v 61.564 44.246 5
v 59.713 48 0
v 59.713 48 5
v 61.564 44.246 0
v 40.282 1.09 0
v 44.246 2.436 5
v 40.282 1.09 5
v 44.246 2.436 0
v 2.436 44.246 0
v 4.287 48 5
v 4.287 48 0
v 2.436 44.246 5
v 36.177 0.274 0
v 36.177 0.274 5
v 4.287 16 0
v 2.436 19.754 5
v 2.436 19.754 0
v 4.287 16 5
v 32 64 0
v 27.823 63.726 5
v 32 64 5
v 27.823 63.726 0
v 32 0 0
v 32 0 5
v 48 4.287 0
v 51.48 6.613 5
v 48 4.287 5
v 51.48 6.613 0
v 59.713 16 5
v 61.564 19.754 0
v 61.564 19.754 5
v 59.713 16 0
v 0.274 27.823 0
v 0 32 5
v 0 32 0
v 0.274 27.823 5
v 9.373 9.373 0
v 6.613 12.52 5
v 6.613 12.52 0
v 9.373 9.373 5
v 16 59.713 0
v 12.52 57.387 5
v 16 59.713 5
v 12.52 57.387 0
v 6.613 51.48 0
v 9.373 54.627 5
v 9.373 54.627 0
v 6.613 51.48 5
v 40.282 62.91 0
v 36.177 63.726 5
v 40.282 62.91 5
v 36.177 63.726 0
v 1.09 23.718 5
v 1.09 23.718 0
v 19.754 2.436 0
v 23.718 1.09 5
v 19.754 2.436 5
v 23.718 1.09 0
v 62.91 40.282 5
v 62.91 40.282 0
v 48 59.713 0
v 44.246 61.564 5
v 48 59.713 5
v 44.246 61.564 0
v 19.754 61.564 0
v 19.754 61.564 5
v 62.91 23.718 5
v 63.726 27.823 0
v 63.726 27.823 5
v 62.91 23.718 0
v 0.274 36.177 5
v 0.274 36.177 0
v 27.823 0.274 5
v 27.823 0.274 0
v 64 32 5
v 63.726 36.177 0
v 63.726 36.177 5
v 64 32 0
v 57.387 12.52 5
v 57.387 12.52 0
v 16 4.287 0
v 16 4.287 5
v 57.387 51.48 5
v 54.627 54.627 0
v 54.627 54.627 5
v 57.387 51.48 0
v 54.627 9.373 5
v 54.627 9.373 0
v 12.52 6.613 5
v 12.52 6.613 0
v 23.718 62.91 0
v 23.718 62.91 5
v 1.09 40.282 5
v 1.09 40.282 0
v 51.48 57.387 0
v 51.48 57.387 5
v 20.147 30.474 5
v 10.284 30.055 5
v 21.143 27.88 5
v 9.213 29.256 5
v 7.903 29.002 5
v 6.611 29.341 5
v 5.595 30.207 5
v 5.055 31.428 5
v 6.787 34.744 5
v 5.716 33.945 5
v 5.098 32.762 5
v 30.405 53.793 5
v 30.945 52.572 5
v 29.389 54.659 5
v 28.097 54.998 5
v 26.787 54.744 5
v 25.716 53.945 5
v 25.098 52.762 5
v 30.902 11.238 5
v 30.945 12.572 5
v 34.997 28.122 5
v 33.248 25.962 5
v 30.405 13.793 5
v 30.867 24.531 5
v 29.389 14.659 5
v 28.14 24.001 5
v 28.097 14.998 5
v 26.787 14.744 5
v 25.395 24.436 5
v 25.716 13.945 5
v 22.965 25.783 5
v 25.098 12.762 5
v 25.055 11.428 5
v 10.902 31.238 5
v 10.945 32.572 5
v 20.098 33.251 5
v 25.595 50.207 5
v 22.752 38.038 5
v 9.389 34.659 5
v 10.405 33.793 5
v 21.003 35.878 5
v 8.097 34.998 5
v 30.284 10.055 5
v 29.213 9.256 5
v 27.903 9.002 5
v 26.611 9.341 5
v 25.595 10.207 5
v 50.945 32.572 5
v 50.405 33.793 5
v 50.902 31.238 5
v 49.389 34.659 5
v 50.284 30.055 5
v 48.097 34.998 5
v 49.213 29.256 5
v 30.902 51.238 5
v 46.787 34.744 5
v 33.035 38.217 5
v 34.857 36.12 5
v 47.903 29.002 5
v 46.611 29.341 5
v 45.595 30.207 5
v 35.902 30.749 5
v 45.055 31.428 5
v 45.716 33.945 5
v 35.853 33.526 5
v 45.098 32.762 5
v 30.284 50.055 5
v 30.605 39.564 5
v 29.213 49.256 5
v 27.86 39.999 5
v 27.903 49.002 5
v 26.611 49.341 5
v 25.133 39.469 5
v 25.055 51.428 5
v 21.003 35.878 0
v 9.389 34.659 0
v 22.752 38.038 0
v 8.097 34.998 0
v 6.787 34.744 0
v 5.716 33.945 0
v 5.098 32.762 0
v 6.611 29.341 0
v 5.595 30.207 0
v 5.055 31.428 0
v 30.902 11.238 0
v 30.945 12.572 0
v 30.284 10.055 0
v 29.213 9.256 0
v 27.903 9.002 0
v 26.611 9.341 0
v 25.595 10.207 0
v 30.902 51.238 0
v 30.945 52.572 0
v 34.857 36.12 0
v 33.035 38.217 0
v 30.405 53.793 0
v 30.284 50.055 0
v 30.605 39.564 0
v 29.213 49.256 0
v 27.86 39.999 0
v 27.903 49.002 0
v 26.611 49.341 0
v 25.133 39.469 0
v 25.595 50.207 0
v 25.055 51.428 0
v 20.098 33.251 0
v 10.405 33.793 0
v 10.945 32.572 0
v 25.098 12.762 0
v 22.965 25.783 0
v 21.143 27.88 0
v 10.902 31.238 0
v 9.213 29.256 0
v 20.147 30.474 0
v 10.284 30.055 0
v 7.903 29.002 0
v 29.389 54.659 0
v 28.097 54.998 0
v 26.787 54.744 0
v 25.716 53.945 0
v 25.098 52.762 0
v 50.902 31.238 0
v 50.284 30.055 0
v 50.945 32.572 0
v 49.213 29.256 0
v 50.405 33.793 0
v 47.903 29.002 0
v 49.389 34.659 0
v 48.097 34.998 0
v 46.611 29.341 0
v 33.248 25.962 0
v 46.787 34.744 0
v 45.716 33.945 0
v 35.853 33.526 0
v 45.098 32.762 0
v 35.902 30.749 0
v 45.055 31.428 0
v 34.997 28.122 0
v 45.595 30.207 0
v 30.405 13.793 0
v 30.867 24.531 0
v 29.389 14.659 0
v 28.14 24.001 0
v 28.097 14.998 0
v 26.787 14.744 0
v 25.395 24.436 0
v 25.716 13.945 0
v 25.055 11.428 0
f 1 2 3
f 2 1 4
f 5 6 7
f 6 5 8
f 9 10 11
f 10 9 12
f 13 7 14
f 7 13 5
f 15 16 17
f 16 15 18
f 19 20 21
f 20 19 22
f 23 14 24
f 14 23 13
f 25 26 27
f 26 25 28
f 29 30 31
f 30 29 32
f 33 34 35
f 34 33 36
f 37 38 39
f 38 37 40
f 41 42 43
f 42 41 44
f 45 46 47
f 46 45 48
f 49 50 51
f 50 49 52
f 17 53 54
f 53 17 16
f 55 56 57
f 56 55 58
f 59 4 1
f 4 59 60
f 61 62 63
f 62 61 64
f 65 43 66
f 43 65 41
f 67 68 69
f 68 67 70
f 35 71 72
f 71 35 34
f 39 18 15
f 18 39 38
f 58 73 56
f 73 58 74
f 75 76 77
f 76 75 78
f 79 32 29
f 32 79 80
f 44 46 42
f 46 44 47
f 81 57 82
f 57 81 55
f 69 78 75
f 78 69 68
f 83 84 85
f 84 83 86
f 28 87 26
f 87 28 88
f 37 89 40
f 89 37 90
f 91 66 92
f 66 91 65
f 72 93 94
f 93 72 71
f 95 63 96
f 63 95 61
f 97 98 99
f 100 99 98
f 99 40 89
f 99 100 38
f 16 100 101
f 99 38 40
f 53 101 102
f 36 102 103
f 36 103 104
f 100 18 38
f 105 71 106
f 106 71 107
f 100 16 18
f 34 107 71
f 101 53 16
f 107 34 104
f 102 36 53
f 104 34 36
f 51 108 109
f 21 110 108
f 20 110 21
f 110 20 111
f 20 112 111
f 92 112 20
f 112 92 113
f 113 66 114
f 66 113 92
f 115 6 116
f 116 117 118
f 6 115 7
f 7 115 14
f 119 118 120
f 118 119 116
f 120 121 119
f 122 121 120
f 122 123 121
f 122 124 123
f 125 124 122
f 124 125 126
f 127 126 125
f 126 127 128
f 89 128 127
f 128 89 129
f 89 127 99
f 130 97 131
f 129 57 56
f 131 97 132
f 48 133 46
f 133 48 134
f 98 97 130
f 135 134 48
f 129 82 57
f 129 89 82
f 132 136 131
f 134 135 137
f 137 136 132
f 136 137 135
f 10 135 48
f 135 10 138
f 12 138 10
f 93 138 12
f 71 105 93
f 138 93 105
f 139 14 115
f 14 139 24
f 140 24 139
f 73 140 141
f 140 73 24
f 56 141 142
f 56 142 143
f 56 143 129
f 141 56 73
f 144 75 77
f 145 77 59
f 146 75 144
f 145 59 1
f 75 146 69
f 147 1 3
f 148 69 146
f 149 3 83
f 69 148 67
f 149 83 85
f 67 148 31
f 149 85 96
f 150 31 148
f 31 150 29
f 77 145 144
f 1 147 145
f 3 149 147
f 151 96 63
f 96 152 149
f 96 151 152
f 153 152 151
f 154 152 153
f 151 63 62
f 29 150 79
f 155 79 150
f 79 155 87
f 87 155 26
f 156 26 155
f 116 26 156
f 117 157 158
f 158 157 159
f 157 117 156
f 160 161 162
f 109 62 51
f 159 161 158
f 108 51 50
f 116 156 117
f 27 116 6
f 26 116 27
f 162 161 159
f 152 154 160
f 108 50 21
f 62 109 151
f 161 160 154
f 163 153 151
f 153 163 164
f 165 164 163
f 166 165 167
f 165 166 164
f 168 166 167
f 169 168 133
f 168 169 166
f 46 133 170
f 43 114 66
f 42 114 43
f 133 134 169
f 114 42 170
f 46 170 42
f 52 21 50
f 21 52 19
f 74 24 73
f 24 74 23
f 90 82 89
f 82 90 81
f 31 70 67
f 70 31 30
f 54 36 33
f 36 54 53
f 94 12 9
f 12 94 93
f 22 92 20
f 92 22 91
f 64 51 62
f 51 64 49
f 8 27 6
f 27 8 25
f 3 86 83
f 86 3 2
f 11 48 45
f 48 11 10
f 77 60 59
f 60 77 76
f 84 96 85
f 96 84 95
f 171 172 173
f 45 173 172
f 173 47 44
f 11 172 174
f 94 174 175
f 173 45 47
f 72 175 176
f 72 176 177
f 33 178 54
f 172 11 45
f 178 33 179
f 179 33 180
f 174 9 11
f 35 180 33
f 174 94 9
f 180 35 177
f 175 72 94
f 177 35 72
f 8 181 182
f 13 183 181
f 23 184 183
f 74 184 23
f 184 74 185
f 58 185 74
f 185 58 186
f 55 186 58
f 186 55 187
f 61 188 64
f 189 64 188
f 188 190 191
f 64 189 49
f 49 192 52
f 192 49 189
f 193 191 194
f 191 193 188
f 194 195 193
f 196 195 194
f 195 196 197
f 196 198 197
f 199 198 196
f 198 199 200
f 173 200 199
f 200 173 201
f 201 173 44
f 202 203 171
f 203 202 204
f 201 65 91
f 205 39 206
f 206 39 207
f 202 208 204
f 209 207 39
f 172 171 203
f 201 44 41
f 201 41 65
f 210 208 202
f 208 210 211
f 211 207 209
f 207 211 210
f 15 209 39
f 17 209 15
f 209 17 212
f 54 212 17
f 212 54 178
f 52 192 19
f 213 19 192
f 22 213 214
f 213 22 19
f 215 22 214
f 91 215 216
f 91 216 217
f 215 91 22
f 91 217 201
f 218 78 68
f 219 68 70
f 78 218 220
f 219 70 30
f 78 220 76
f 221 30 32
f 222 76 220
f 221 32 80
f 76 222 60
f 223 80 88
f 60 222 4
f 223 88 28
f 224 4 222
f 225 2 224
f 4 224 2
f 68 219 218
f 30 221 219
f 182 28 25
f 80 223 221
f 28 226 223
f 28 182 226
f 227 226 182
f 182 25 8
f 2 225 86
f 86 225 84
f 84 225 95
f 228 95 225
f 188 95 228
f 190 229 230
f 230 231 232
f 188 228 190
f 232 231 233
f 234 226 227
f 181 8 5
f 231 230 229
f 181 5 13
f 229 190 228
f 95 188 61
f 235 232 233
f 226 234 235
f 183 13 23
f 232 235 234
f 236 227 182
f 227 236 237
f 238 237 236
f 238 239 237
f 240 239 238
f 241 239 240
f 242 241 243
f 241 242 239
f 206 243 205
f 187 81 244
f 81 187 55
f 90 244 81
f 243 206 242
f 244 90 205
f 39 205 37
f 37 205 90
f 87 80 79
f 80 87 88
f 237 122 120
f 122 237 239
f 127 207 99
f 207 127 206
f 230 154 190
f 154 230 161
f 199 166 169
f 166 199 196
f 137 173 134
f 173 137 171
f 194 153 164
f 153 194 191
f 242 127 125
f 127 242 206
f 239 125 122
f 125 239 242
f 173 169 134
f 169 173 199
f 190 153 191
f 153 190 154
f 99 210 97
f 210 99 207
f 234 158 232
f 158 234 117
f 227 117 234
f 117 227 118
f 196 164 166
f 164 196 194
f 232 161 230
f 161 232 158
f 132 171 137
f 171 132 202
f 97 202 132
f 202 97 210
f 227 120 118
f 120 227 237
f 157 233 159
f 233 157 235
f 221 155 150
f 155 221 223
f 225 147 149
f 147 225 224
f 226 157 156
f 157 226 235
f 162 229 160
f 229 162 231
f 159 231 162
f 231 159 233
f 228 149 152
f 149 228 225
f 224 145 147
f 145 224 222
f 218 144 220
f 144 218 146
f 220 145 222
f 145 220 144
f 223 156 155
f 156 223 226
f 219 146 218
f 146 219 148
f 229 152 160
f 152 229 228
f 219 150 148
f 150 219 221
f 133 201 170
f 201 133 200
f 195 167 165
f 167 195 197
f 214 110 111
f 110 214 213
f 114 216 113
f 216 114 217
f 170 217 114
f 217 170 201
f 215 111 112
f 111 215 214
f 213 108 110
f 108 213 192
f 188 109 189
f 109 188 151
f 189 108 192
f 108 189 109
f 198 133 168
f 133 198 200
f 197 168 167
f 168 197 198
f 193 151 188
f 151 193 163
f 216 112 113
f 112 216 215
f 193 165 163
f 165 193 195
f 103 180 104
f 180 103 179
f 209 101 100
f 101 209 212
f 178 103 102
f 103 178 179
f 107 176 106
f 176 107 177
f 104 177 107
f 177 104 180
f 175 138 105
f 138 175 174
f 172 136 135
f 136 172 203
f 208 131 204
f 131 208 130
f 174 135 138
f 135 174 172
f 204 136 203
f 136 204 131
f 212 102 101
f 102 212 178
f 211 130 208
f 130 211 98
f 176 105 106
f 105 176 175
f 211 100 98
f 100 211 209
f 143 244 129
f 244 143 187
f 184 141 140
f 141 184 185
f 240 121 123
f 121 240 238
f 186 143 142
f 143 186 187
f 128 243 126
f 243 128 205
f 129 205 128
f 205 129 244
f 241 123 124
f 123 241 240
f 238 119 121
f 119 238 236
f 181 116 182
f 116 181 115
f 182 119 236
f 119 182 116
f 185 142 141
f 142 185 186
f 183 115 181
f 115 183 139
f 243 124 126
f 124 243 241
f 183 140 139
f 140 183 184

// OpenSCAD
$fn = 32;

// ----------------------------------------------------------------------
// Cam plate: eccentric cam, base R32
// ----------------------------------------------------------------------

// --- parameters (mm) ---
base_r = 32;              // base circle radius
lobe_h = 14;              // cam lobe rise
bore_r = 8;               // shaft bore radius
plate_t = 5;              // plate thickness, Z (extrusion height)
ecc = 4;                  // disc eccentricity
ring_r = 20;              // lightening ring radius
bolt_r = 3;               // lightening hole radius
fit_tol = 0.05;           // declared fit tolerance (prompt contract)
free_tol = 0.3;           // declared free tolerance (prompt contract)

profile = [[64, 32], [63.726, 36.177], [62.91, 40.282], [61.564, 44.246], [59.713, 48], [57.387, 51.48], [54.627, 54.627], [51.48, 57.387], [48, 59.713], [44.246, 61.564], [40.282, 62.91], [36.177, 63.726], [32, 64], [27.823, 63.726], [23.718, 62.91], [19.754, 61.564], [16, 59.713], [12.52, 57.387], [9.373, 54.627], [6.613, 51.48], [4.287, 48], [2.436, 44.246], [1.09, 40.282], [0.274, 36.177], [0, 32], [0.274, 27.823], [1.09, 23.718], [2.436, 19.754], [4.287, 16], [6.613, 12.52], [9.373, 9.373], [12.52, 6.613], [16, 4.287], [19.754, 2.436], [23.718, 1.09], [27.823, 0.274], [32, 0], [36.177, 0.274], [40.282, 1.09], [44.246, 2.436], [48, 4.287], [51.48, 6.613], [54.627, 9.373], [57.387, 12.52], [59.713, 16], [61.564, 19.754], [62.91, 23.718], [63.726, 27.823]];  // primary outline, 48 points, counter clockwise
void_1 = [[35.853, 33.526], [34.857, 36.12], [33.035, 38.217], [30.605, 39.564], [27.86, 39.999], [25.133, 39.469], [22.752, 38.038], [21.003, 35.878], [20.098, 33.251], [20.147, 30.474], [21.143, 27.88], [22.965, 25.783], [25.395, 24.436], [28.14, 24.001], [30.867, 24.531], [33.248, 25.962], [34.997, 28.122], [35.902, 30.749]];  // shaft bore, 18 points
void_2 = [[50.945, 32.572], [50.405, 33.793], [49.389, 34.659], [48.097, 34.998], [46.787, 34.744], [45.716, 33.945], [45.098, 32.762], [45.055, 31.428], [45.595, 30.207], [46.611, 29.341], [47.903, 29.002], [49.213, 29.256], [50.284, 30.055], [50.902, 31.238]];  // lightening hole 1, 14 points
void_3 = [[30.945, 52.572], [30.405, 53.793], [29.389, 54.659], [28.097, 54.998], [26.787, 54.744], [25.716, 53.945], [25.098, 52.762], [25.055, 51.428], [25.595, 50.207], [26.611, 49.341], [27.903, 49.002], [29.213, 49.256], [30.284, 50.055], [30.902, 51.238]];  // lightening hole 2, 14 points
void_4 = [[10.945, 32.572], [10.405, 33.793], [9.389, 34.659], [8.097, 34.998], [6.787, 34.744], [5.716, 33.945], [5.098, 32.762], [5.055, 31.428], [5.595, 30.207], [6.611, 29.341], [7.903, 29.002], [9.213, 29.256], [10.284, 30.055], [10.902, 31.238]];  // lightening hole 3, 14 points
void_5 = [[30.945, 12.572], [30.405, 13.793], [29.389, 14.659], [28.097, 14.998], [26.787, 14.744], [25.716, 13.945], [25.098, 12.762], [25.055, 11.428], [25.595, 10.207], [26.611, 9.341], [27.903, 9.002], [29.213, 9.256], [30.284, 10.055], [30.902, 11.238]];  // lightening hole 4, 14 points

// --- the one profile operation ---
difference() {
  linear_extrude(height = plate_t) polygon(points = profile);
  translate([0, 0, -1])
    linear_extrude(height = plate_t + 2) polygon(points = void_1);
  translate([0, 0, -1])
    linear_extrude(height = plate_t + 2) polygon(points = void_2);
  translate([0, 0, -1])
    linear_extrude(height = plate_t + 2) polygon(points = void_3);
  translate([0, 0, -1])
    linear_extrude(height = plate_t + 2) polygon(points = void_4);
  translate([0, 0, -1])
    linear_extrude(height = plate_t + 2) polygon(points = void_5);
}
